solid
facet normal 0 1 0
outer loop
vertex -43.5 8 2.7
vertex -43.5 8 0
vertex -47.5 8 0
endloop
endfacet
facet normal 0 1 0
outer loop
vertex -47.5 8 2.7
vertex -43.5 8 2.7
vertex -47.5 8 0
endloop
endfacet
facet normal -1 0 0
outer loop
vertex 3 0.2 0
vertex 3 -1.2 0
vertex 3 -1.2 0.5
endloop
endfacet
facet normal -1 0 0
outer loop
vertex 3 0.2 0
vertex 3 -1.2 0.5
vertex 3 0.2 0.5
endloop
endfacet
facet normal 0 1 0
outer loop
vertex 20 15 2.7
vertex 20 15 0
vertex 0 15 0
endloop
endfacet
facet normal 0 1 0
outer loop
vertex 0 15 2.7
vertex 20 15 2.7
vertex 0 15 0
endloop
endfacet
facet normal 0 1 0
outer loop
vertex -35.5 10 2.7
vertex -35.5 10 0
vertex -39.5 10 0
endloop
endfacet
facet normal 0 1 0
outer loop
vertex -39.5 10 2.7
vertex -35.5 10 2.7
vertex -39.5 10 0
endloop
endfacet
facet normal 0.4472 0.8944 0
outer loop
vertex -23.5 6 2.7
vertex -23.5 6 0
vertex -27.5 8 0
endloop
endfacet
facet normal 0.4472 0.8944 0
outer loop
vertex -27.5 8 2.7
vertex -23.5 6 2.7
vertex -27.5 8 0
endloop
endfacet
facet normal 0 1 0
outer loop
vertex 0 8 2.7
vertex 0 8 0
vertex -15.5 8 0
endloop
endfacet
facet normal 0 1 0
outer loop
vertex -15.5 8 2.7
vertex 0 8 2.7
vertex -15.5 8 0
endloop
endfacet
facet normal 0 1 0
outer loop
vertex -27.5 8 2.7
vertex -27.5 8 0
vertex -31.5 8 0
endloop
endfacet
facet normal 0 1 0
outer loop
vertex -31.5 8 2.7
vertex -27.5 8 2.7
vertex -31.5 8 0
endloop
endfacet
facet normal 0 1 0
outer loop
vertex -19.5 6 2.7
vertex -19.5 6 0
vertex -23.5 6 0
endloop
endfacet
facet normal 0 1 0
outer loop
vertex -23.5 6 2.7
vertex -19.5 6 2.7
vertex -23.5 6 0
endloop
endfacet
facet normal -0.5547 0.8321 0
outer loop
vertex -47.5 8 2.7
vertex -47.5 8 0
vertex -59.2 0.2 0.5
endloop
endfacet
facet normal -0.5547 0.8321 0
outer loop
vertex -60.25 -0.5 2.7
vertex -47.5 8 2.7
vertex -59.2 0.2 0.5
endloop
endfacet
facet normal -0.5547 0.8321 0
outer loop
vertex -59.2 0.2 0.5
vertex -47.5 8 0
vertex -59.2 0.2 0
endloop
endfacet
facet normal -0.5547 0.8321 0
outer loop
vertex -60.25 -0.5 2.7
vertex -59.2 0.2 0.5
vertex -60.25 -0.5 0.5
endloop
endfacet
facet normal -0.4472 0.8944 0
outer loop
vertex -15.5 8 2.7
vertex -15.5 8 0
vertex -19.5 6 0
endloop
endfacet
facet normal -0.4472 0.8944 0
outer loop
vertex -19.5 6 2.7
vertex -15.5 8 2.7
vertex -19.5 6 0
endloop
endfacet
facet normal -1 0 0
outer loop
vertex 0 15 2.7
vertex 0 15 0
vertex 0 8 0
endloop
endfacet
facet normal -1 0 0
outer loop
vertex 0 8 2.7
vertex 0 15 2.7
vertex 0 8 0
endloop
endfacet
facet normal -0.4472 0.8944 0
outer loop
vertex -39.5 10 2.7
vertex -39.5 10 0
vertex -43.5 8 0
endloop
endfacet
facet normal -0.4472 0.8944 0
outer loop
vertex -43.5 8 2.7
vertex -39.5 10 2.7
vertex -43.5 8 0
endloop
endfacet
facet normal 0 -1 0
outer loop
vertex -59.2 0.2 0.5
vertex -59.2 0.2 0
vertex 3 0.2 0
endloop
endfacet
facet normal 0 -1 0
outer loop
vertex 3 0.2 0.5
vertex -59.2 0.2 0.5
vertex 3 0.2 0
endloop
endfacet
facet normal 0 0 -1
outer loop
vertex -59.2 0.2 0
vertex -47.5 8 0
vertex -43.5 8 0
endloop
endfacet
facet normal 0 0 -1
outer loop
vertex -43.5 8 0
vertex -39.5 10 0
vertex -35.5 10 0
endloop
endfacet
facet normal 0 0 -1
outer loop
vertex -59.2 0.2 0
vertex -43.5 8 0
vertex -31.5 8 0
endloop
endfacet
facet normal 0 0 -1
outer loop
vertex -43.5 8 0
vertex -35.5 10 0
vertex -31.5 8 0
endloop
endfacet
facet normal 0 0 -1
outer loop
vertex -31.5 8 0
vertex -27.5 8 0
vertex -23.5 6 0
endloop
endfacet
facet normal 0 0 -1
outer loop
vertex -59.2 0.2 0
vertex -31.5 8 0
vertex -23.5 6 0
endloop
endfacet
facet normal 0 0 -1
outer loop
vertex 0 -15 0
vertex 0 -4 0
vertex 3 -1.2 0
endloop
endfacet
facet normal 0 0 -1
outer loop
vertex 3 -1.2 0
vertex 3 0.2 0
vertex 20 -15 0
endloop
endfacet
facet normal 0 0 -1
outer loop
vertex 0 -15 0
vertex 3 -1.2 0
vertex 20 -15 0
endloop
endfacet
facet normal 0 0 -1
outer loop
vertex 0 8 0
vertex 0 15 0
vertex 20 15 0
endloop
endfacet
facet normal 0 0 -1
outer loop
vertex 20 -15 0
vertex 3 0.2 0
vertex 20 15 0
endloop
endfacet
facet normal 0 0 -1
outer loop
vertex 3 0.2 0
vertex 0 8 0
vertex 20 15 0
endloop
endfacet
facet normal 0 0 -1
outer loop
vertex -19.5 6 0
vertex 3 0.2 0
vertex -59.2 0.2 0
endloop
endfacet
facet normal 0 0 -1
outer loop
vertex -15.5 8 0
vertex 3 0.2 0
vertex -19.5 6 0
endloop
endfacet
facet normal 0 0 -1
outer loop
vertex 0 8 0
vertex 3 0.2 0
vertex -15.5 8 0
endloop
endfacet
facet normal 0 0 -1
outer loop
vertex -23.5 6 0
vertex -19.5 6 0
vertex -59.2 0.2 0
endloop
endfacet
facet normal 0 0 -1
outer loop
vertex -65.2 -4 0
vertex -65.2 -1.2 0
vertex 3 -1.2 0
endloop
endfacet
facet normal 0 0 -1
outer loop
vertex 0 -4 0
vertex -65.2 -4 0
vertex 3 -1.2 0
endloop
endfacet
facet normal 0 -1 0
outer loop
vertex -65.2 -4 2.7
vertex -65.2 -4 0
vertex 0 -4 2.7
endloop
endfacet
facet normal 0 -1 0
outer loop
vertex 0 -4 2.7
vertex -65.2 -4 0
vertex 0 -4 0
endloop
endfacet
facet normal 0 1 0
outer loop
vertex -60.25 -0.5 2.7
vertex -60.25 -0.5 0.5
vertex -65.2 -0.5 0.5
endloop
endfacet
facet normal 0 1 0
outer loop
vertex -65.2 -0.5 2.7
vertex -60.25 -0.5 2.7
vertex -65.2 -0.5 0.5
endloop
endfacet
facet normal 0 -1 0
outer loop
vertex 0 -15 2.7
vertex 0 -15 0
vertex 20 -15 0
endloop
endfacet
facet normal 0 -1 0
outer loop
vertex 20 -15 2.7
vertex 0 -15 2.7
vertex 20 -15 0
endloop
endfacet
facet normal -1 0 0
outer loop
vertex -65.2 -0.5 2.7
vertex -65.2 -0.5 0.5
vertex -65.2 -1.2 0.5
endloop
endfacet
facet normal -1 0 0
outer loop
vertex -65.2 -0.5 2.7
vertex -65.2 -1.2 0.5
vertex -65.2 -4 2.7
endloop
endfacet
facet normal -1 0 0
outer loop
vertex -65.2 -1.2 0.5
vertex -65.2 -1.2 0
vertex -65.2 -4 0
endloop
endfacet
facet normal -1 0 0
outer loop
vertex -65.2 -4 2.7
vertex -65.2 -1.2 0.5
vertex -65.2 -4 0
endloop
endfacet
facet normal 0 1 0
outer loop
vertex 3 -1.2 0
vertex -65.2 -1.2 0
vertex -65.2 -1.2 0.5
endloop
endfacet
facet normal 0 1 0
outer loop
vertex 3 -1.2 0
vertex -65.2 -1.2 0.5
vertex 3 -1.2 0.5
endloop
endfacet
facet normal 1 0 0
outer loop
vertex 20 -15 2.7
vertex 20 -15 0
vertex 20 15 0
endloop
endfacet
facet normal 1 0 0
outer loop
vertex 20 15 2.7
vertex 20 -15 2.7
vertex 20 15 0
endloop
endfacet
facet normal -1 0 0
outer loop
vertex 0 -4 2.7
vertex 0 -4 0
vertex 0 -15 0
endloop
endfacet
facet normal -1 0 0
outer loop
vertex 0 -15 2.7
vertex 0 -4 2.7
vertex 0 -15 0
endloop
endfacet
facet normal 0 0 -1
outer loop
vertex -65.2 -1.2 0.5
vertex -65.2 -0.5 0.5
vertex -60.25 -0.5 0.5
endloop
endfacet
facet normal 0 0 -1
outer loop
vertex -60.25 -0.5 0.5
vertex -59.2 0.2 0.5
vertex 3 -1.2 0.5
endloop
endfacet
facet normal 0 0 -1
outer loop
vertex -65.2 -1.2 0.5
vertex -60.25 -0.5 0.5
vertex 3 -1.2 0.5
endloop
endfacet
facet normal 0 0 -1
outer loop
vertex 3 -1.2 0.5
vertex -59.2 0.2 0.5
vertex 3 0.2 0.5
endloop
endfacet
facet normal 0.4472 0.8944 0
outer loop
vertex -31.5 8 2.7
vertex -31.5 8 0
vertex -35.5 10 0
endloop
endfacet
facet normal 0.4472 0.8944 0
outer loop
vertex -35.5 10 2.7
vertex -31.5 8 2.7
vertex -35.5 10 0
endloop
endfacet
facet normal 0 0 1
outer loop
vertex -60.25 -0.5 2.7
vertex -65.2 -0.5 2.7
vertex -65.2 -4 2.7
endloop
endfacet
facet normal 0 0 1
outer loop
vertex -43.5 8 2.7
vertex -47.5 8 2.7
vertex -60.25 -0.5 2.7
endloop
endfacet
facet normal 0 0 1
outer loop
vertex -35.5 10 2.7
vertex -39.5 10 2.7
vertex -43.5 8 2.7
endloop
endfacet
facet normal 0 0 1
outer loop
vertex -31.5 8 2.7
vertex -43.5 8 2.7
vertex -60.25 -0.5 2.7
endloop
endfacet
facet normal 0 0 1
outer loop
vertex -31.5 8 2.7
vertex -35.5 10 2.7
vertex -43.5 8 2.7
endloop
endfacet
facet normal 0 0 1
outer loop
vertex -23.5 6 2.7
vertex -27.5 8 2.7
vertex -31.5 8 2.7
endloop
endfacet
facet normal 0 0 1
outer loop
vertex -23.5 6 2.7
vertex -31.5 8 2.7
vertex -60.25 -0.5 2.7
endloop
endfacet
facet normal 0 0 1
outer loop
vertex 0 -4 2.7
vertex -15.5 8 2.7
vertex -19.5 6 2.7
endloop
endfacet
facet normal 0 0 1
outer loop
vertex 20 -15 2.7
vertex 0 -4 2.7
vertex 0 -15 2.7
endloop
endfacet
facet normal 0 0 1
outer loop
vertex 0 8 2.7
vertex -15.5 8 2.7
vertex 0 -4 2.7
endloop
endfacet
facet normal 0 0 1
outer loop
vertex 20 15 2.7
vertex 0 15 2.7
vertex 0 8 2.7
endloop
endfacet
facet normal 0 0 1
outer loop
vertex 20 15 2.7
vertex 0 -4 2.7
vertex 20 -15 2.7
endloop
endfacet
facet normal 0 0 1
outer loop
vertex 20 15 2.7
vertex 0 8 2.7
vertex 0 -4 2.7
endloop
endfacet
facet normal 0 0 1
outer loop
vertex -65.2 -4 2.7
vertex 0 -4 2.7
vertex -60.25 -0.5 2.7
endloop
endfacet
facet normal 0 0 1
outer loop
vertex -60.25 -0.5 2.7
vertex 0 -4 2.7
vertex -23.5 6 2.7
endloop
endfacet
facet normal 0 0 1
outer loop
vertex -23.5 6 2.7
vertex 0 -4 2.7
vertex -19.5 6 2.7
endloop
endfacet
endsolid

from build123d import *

# Parameters (mm, degrees)
BOSS_EXTRUDE1_DEPTH = 2.7
CUT_EXTRUDE1_START  = -2.7
SKETCH2_W           = 68.2
SKETCH2_H           = 1.4
CUT_EXTRUDE1_DEPTH  = 0.5


with BuildPart() as part:
    # Sketch1 → Boss-Extrude1 (new body)
    with BuildSketch(Plane.XY):
        Polygon((20, 15), (0, 15), (0, 8), (-15.5, 8), (-19.5, 6), (-23.5, 6), (-27.5, 8), (-31.5, 8), (-35.5, 10), (-39.5, 10), (-43.5, 8), (-47.5, 8), (-60.25, -0.5), (-65.2, -0.5), (-65.2, -4), (0, -4), (0, -15), (20, -15), align=None)
    extrude(amount=BOSS_EXTRUDE1_DEPTH)

    # Sketch2 → Cut-Extrude1 (cut)
    with BuildSketch(Plane.XY.offset(2.7).offset(CUT_EXTRUDE1_START)):
        with Locations((-31.1, -0.5)):
            Rectangle(SKETCH2_W, SKETCH2_H)
    extrude(amount=CUT_EXTRUDE1_DEPTH, mode=Mode.SUBTRACT)


solid = part.part
